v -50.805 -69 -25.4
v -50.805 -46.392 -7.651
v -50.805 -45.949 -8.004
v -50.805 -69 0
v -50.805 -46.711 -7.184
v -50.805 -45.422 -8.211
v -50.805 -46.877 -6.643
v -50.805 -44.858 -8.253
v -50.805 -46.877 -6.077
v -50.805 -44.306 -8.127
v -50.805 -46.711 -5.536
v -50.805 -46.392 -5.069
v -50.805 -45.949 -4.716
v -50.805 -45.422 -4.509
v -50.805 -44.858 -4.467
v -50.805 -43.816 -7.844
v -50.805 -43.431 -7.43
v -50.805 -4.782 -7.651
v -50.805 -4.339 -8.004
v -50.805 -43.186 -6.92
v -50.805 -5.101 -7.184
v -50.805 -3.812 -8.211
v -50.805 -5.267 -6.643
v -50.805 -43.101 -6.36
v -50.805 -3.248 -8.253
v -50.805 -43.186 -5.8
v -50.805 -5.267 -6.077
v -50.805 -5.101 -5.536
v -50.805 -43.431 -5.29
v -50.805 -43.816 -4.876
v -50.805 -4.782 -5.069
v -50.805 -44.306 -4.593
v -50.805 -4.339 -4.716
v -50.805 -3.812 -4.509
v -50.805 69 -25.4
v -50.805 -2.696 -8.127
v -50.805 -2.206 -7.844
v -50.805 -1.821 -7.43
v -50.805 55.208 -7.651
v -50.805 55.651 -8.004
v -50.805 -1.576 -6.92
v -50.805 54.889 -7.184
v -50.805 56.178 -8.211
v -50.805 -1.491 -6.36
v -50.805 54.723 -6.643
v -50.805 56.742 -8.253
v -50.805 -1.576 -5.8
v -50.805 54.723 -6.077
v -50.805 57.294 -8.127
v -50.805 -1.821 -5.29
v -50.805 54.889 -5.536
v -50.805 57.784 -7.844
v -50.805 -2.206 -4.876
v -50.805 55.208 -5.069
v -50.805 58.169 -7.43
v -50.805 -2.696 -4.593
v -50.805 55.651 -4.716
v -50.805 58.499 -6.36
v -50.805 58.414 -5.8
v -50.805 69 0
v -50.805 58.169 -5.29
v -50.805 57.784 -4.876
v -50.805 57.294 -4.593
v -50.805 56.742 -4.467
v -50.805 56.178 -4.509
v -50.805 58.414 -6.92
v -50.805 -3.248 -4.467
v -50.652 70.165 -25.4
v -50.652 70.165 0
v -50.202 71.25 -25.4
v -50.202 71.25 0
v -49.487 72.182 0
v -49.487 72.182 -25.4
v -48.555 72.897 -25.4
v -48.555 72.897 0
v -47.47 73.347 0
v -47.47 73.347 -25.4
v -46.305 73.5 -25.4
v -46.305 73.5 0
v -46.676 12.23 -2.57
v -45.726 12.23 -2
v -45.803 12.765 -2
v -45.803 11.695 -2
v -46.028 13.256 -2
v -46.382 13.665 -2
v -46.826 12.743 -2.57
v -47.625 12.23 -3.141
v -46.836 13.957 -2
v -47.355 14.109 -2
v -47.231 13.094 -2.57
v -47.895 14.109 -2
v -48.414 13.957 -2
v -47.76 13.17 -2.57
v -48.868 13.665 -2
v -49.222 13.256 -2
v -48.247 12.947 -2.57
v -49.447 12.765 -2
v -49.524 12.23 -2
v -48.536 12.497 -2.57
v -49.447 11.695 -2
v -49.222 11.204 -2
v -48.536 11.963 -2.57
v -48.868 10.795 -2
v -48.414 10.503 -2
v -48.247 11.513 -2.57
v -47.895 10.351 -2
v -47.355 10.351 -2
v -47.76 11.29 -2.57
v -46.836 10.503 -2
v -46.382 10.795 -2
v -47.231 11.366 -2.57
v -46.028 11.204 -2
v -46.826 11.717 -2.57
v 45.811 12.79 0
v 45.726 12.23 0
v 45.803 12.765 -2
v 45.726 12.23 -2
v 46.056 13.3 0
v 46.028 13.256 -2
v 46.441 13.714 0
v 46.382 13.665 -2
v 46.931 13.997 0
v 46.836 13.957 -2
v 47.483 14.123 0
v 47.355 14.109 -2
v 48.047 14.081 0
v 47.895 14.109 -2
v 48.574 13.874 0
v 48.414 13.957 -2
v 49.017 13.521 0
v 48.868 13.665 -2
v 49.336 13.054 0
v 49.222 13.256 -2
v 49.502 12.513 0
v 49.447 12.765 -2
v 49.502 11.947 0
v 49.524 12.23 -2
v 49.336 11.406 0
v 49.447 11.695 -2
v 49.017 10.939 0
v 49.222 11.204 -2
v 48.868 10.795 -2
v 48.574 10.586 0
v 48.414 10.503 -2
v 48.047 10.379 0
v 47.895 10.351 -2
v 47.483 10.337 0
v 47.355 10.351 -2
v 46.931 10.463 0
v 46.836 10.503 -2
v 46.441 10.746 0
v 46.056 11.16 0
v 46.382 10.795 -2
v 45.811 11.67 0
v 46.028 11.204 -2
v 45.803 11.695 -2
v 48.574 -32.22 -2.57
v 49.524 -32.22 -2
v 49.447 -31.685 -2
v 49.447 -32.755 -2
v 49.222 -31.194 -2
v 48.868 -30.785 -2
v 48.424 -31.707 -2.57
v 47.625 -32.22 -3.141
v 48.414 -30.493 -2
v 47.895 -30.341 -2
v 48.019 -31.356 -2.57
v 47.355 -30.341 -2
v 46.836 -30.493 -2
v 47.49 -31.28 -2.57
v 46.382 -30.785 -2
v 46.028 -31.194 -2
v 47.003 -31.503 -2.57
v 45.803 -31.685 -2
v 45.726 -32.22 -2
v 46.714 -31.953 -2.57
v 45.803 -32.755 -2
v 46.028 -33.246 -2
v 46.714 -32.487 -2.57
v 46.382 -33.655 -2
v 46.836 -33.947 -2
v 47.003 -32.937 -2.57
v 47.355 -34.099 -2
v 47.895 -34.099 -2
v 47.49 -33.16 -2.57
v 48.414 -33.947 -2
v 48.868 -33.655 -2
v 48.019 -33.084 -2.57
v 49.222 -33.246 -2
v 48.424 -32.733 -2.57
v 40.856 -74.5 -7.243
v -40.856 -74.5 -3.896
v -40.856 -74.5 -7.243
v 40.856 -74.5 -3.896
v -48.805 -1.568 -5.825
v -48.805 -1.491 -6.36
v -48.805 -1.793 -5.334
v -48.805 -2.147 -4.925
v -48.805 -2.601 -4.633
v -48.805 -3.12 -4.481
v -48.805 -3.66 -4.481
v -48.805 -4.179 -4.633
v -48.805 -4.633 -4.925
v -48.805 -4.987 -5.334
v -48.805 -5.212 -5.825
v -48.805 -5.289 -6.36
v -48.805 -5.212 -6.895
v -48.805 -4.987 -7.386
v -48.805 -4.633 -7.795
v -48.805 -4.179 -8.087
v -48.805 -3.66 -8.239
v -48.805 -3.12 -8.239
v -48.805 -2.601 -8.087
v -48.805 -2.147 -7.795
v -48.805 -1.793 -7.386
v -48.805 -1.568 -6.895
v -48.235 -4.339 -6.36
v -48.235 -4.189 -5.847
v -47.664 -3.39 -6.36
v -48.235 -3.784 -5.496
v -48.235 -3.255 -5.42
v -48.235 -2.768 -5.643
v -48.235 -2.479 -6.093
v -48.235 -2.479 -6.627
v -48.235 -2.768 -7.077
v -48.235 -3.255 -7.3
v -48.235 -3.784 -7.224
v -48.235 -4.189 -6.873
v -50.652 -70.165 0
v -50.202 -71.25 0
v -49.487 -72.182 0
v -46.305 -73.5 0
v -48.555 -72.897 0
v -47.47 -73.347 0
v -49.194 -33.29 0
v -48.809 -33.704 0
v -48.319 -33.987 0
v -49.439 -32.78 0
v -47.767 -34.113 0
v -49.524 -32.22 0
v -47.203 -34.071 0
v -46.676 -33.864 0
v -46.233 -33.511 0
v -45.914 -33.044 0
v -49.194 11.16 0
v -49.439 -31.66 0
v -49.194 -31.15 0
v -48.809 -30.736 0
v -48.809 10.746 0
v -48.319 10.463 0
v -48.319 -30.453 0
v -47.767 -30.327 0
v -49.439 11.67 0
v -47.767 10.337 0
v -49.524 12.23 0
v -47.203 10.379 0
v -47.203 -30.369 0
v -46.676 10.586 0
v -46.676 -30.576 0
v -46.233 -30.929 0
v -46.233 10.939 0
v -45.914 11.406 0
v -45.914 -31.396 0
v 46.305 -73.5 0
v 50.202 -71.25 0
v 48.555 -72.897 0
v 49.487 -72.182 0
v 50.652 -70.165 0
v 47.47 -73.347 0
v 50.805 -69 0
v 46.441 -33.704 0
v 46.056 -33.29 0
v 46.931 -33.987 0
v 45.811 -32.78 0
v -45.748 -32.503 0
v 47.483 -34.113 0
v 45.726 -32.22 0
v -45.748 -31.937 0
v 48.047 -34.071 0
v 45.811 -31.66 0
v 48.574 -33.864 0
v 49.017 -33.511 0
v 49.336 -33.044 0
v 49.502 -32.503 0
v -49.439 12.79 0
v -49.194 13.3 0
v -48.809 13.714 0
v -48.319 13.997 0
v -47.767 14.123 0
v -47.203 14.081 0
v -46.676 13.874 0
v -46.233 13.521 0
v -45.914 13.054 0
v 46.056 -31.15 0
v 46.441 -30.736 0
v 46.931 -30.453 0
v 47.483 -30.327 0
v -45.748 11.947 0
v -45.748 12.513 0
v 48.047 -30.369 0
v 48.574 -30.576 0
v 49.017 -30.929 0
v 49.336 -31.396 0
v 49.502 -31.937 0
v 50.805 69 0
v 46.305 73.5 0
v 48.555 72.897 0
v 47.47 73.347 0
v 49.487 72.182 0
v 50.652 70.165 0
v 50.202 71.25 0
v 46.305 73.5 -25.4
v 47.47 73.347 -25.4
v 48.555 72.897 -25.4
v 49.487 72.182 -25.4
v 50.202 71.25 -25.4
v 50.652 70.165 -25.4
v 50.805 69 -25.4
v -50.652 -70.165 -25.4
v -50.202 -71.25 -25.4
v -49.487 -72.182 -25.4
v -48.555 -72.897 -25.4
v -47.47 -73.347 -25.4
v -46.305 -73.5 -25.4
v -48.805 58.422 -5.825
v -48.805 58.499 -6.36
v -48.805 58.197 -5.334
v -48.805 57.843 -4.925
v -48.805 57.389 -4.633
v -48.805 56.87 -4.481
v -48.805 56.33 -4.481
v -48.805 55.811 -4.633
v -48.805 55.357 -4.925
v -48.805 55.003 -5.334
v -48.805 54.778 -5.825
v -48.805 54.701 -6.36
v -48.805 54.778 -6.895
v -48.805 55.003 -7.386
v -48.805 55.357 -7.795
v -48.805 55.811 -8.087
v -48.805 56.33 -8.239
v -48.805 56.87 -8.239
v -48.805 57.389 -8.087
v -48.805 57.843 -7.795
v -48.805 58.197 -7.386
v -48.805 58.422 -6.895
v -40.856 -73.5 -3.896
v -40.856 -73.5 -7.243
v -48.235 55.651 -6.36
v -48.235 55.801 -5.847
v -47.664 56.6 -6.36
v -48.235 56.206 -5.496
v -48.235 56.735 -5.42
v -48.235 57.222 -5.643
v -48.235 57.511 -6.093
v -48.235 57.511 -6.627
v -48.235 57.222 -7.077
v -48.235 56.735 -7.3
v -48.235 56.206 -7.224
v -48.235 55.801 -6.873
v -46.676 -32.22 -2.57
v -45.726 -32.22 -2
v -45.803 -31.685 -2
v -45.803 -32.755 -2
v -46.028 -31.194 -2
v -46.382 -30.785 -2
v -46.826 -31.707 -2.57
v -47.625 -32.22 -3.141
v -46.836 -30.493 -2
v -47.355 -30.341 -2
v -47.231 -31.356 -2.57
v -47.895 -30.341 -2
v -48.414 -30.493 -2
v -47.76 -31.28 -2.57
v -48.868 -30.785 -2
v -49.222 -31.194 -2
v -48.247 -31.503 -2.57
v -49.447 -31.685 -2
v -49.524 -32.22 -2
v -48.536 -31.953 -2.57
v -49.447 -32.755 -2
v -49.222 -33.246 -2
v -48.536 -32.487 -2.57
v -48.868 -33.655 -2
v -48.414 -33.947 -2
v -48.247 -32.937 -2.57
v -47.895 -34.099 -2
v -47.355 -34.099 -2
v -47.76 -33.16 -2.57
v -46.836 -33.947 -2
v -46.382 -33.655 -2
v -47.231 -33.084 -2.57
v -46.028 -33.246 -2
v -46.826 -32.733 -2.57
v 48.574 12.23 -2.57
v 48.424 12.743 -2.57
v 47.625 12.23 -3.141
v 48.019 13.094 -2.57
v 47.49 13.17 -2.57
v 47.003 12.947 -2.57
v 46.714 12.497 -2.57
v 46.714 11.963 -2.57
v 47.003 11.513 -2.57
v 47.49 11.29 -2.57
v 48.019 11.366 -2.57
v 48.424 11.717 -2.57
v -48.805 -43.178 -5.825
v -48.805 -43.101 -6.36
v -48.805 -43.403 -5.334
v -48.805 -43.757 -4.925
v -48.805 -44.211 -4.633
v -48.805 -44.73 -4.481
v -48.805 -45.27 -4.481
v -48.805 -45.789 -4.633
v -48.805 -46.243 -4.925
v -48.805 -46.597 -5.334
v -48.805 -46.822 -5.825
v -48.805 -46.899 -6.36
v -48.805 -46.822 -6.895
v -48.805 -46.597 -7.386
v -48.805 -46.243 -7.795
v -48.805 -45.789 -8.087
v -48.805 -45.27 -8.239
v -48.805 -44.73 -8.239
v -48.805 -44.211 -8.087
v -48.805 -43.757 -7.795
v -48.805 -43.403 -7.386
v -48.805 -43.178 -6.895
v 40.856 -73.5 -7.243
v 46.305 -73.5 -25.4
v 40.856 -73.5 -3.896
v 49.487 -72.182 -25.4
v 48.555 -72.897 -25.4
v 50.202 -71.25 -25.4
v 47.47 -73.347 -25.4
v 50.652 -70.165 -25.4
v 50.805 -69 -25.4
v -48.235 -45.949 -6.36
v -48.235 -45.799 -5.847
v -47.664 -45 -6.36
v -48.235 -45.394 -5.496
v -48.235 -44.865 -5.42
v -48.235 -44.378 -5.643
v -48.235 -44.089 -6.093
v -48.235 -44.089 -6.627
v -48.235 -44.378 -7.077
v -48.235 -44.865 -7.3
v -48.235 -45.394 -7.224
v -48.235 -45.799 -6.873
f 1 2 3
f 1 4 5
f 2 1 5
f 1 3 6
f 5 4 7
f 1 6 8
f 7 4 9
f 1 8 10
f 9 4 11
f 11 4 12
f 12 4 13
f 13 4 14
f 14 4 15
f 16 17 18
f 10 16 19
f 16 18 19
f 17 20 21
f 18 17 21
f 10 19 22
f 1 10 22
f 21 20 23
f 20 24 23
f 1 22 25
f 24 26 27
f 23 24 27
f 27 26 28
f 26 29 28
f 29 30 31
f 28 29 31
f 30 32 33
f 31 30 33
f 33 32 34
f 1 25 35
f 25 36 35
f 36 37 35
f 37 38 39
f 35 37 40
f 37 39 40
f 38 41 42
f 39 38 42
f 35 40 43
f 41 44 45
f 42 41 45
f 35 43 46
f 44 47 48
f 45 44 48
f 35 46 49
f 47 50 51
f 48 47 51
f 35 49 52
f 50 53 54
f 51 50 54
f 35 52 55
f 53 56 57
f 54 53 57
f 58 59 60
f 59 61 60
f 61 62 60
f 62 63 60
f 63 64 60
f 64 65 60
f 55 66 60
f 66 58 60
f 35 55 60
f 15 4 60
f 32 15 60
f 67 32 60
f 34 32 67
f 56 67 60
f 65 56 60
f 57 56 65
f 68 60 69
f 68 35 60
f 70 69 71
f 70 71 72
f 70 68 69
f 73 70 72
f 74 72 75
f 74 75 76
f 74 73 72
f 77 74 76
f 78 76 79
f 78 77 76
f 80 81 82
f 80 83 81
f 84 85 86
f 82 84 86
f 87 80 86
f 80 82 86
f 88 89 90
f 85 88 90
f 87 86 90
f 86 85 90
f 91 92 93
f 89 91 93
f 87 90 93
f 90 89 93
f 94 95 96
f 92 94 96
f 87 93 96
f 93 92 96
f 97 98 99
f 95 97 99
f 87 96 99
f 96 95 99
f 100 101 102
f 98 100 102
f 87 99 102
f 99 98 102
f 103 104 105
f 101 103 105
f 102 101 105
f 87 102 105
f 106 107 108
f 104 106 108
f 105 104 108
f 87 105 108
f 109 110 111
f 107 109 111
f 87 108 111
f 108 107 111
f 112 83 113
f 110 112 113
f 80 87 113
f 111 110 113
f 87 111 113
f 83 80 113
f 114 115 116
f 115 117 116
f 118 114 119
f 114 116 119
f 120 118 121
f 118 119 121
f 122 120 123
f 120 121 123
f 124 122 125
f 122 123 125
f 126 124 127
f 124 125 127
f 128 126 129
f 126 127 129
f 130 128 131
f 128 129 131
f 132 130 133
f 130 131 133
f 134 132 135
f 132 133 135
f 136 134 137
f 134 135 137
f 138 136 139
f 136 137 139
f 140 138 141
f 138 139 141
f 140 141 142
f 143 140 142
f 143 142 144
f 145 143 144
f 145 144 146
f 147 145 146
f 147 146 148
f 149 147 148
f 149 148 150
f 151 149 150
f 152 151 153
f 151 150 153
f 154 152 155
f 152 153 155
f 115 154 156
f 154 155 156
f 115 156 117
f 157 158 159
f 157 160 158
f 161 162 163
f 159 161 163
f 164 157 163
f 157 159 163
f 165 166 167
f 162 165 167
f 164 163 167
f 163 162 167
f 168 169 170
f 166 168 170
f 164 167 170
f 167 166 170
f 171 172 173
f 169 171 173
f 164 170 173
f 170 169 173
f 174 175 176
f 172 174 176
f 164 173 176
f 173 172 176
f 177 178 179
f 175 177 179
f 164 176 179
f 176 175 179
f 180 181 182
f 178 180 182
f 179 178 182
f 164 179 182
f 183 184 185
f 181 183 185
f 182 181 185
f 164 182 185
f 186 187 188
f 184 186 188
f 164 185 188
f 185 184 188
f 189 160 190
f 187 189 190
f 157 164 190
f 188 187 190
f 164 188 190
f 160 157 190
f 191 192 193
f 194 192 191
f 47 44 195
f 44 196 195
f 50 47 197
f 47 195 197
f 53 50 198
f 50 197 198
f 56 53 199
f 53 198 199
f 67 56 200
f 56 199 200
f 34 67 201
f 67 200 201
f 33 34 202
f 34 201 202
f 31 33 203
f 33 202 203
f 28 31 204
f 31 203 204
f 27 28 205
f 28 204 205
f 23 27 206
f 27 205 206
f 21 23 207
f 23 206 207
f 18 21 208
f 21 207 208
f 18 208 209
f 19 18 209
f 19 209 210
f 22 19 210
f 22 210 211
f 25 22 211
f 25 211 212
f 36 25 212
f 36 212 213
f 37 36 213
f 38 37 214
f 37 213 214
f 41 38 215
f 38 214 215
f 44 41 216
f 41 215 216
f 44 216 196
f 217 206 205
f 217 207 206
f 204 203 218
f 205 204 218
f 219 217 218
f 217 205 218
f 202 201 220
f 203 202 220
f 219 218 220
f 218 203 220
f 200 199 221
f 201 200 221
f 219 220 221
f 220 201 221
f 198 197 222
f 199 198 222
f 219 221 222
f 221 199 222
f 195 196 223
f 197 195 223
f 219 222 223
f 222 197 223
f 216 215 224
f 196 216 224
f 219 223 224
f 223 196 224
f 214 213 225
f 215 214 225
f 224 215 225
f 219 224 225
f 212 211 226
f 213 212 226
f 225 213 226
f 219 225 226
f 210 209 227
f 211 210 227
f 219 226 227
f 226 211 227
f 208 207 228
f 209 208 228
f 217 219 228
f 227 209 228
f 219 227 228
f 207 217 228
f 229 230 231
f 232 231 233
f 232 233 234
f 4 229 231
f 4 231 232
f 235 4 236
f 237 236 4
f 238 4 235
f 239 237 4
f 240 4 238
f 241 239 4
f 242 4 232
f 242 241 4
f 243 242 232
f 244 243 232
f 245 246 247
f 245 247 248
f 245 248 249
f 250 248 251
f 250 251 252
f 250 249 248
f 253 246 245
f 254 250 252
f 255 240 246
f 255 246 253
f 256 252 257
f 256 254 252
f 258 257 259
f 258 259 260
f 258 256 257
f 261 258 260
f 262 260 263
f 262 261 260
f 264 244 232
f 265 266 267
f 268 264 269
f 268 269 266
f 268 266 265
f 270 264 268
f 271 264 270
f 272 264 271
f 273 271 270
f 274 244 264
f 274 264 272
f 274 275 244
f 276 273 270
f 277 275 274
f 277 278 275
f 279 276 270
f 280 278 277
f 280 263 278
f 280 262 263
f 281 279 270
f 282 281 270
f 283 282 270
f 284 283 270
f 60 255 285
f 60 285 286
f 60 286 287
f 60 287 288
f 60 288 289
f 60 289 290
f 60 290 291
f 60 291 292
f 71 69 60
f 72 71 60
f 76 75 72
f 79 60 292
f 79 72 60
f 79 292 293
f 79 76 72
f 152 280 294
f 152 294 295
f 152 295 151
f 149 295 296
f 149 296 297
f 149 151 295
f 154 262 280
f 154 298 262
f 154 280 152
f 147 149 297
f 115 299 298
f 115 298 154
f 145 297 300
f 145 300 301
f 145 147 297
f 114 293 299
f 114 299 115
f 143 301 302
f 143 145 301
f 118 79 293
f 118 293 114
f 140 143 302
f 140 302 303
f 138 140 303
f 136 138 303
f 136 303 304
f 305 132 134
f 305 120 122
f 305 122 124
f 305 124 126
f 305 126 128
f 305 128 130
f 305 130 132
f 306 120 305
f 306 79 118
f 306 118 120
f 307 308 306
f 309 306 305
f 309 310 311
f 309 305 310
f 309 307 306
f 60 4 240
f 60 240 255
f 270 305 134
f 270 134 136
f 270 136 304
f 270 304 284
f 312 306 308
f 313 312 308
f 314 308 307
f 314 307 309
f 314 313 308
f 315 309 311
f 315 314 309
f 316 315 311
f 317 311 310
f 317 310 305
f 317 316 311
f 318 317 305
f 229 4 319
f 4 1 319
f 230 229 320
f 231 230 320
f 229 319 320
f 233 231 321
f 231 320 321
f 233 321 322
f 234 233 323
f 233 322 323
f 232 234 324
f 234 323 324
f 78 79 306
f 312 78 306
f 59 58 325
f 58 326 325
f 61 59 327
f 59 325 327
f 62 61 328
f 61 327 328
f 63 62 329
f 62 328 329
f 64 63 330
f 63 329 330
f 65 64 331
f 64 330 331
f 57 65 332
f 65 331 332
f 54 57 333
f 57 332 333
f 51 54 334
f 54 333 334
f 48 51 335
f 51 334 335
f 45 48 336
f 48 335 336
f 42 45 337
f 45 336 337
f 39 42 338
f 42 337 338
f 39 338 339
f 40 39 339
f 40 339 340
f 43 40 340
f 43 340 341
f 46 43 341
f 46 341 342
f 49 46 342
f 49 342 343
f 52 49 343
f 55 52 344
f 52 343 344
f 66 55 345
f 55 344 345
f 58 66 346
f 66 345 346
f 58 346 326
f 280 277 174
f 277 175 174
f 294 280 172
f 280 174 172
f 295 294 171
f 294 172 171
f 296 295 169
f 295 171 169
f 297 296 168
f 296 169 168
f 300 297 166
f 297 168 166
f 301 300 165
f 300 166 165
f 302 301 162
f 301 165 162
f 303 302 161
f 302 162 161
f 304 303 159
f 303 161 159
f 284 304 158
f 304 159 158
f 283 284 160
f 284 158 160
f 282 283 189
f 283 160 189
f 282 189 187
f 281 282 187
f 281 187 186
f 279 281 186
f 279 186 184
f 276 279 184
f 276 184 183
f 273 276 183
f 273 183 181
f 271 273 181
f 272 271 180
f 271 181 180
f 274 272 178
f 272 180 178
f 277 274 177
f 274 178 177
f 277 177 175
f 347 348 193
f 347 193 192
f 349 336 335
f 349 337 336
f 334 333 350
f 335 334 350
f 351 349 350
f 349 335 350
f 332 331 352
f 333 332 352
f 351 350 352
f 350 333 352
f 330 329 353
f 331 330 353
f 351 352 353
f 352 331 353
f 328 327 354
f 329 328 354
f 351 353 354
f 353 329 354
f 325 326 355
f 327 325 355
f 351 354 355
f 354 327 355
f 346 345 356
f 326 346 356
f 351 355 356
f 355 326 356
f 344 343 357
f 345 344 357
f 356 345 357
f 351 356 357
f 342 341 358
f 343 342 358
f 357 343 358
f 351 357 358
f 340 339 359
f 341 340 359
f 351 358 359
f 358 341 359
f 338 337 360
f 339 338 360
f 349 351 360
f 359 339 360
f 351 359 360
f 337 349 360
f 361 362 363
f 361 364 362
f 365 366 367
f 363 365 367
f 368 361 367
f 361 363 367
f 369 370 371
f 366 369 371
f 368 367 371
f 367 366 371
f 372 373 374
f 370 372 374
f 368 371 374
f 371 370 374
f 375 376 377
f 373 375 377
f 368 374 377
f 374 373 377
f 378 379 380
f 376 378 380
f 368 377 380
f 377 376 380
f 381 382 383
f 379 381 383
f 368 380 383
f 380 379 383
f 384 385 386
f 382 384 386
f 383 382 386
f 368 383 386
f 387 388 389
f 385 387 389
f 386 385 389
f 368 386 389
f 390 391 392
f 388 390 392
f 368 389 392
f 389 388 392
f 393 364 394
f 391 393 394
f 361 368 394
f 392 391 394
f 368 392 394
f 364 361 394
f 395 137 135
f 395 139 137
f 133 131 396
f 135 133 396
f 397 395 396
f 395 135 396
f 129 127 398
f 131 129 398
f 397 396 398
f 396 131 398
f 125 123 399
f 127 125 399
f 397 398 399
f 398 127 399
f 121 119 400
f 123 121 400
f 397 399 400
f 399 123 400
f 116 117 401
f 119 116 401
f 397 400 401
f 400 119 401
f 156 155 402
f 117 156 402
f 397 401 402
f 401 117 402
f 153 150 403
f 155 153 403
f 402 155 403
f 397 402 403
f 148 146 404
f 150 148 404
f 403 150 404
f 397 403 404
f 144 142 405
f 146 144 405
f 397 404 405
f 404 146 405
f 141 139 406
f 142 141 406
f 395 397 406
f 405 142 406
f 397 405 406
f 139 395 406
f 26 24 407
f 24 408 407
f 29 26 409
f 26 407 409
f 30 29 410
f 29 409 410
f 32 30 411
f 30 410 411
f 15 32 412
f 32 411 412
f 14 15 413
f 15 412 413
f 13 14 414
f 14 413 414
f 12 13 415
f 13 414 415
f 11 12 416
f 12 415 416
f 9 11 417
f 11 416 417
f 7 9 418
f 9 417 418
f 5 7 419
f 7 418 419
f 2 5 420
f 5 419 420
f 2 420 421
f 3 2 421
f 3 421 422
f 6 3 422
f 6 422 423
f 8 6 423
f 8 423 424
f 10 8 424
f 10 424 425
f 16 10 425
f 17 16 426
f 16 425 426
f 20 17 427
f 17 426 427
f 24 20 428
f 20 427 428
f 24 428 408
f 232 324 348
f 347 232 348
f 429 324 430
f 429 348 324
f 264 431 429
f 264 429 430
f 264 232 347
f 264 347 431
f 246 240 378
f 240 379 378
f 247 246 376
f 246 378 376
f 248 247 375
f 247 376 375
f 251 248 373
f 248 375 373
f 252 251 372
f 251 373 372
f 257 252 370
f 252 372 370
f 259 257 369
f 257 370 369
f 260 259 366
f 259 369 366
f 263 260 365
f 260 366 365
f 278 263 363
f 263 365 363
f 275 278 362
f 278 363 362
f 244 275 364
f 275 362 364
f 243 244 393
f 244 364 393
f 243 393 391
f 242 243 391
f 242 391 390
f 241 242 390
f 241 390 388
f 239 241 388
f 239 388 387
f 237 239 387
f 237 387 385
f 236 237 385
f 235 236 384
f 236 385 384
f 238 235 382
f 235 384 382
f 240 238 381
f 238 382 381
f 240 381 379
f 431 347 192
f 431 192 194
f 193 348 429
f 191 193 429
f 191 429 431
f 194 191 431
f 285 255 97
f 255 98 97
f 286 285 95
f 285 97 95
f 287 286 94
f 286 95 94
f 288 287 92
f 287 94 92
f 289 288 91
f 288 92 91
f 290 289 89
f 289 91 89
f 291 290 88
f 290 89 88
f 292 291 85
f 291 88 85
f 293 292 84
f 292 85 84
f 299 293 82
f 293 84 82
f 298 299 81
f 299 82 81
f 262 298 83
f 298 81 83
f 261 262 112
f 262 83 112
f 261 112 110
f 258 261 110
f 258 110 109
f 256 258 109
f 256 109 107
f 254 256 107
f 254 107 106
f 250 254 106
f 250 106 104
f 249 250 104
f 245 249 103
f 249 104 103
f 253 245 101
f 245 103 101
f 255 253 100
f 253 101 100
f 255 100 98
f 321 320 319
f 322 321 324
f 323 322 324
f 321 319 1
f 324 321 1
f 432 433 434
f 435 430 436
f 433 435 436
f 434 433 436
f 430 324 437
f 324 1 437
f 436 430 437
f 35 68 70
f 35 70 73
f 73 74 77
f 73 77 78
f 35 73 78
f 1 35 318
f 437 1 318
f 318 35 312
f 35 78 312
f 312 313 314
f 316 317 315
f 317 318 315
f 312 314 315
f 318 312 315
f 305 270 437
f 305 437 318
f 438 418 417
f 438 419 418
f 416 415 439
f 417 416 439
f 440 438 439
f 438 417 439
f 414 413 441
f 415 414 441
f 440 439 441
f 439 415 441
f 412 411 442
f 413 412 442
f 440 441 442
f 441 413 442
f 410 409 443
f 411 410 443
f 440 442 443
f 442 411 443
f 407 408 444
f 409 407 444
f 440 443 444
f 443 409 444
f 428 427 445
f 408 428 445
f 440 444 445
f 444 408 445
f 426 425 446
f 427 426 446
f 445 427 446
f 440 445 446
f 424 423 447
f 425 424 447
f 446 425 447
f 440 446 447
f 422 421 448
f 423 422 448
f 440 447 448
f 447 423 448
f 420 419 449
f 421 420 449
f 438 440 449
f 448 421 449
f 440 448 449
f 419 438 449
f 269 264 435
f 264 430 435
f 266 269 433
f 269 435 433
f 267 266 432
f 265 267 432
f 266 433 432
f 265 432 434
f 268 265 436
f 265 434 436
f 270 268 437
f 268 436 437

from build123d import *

# Parameters (mm, degrees)
F0_W     = 101.61
F0_H     = 147
F1_DEPTH = 25.4
F2_D     = 3.7973
F2_DEPTH = 2
F2_TIP   = 1.1408240143
F3_R     = 4.5
F5_D     = 3.7973
F5_DEPTH = 2
F5_TIP   = 1.1408240143
F6_W     = 81.7127004266
F6_H     = 3.347503487
F7_DEPTH = 1


with BuildPart() as f1:
    # F0 (on Top) → F1 (new body)
    with BuildSketch(Plane.XY):
        Rectangle(F0_W, F0_H)
    extrude(amount=-F1_DEPTH)

    # F2
    with Locations(Plane.XY):
        with Locations((47.625, -32.22), (-47.625, -32.22), (-47.625, 12.23), (47.625, 12.23)):
            Hole(F2_D / 2, depth=F2_DEPTH)
            with Locations((0, 0, -(F2_DEPTH + F2_TIP / 2))):  # 118° drill point
                Cone(0, F2_D / 2, F2_TIP, mode=Mode.SUBTRACT)

    # F3
    f3_edges = [f1.edges().sort_by_distance(p)[0] for p in [
        (50.805, 73.5, -12.7),
        (-50.805, 73.5, -12.7),
        (-50.805, -73.5, -12.7),
        (50.805, -73.5, -12.7),
    ]]
    fillet(f3_edges, radius=F3_R)

    # F5
    with Locations(Plane(origin=(-50.805, 0, 0), x_dir=(0, -1, 0), z_dir=(-1, 0, 0))):
        with Locations((45, -6.36), (3.39, -6.36), (-56.6, -6.36)):
            Hole(F5_D / 2, depth=F5_DEPTH)
            with Locations((0, 0, -(F5_DEPTH + F5_TIP / 2))):  # 118° drill point
                Cone(0, F5_D / 2, F5_TIP, mode=Mode.SUBTRACT)

    # F6 (on face) → F7 (join)
    with BuildSketch(Plane.XZ.offset(73.5)):
        with Locations((0, -5.5697378702)):
            Rectangle(F6_W, F6_H)
    extrude(amount=F7_DEPTH)


solid = f1.part
